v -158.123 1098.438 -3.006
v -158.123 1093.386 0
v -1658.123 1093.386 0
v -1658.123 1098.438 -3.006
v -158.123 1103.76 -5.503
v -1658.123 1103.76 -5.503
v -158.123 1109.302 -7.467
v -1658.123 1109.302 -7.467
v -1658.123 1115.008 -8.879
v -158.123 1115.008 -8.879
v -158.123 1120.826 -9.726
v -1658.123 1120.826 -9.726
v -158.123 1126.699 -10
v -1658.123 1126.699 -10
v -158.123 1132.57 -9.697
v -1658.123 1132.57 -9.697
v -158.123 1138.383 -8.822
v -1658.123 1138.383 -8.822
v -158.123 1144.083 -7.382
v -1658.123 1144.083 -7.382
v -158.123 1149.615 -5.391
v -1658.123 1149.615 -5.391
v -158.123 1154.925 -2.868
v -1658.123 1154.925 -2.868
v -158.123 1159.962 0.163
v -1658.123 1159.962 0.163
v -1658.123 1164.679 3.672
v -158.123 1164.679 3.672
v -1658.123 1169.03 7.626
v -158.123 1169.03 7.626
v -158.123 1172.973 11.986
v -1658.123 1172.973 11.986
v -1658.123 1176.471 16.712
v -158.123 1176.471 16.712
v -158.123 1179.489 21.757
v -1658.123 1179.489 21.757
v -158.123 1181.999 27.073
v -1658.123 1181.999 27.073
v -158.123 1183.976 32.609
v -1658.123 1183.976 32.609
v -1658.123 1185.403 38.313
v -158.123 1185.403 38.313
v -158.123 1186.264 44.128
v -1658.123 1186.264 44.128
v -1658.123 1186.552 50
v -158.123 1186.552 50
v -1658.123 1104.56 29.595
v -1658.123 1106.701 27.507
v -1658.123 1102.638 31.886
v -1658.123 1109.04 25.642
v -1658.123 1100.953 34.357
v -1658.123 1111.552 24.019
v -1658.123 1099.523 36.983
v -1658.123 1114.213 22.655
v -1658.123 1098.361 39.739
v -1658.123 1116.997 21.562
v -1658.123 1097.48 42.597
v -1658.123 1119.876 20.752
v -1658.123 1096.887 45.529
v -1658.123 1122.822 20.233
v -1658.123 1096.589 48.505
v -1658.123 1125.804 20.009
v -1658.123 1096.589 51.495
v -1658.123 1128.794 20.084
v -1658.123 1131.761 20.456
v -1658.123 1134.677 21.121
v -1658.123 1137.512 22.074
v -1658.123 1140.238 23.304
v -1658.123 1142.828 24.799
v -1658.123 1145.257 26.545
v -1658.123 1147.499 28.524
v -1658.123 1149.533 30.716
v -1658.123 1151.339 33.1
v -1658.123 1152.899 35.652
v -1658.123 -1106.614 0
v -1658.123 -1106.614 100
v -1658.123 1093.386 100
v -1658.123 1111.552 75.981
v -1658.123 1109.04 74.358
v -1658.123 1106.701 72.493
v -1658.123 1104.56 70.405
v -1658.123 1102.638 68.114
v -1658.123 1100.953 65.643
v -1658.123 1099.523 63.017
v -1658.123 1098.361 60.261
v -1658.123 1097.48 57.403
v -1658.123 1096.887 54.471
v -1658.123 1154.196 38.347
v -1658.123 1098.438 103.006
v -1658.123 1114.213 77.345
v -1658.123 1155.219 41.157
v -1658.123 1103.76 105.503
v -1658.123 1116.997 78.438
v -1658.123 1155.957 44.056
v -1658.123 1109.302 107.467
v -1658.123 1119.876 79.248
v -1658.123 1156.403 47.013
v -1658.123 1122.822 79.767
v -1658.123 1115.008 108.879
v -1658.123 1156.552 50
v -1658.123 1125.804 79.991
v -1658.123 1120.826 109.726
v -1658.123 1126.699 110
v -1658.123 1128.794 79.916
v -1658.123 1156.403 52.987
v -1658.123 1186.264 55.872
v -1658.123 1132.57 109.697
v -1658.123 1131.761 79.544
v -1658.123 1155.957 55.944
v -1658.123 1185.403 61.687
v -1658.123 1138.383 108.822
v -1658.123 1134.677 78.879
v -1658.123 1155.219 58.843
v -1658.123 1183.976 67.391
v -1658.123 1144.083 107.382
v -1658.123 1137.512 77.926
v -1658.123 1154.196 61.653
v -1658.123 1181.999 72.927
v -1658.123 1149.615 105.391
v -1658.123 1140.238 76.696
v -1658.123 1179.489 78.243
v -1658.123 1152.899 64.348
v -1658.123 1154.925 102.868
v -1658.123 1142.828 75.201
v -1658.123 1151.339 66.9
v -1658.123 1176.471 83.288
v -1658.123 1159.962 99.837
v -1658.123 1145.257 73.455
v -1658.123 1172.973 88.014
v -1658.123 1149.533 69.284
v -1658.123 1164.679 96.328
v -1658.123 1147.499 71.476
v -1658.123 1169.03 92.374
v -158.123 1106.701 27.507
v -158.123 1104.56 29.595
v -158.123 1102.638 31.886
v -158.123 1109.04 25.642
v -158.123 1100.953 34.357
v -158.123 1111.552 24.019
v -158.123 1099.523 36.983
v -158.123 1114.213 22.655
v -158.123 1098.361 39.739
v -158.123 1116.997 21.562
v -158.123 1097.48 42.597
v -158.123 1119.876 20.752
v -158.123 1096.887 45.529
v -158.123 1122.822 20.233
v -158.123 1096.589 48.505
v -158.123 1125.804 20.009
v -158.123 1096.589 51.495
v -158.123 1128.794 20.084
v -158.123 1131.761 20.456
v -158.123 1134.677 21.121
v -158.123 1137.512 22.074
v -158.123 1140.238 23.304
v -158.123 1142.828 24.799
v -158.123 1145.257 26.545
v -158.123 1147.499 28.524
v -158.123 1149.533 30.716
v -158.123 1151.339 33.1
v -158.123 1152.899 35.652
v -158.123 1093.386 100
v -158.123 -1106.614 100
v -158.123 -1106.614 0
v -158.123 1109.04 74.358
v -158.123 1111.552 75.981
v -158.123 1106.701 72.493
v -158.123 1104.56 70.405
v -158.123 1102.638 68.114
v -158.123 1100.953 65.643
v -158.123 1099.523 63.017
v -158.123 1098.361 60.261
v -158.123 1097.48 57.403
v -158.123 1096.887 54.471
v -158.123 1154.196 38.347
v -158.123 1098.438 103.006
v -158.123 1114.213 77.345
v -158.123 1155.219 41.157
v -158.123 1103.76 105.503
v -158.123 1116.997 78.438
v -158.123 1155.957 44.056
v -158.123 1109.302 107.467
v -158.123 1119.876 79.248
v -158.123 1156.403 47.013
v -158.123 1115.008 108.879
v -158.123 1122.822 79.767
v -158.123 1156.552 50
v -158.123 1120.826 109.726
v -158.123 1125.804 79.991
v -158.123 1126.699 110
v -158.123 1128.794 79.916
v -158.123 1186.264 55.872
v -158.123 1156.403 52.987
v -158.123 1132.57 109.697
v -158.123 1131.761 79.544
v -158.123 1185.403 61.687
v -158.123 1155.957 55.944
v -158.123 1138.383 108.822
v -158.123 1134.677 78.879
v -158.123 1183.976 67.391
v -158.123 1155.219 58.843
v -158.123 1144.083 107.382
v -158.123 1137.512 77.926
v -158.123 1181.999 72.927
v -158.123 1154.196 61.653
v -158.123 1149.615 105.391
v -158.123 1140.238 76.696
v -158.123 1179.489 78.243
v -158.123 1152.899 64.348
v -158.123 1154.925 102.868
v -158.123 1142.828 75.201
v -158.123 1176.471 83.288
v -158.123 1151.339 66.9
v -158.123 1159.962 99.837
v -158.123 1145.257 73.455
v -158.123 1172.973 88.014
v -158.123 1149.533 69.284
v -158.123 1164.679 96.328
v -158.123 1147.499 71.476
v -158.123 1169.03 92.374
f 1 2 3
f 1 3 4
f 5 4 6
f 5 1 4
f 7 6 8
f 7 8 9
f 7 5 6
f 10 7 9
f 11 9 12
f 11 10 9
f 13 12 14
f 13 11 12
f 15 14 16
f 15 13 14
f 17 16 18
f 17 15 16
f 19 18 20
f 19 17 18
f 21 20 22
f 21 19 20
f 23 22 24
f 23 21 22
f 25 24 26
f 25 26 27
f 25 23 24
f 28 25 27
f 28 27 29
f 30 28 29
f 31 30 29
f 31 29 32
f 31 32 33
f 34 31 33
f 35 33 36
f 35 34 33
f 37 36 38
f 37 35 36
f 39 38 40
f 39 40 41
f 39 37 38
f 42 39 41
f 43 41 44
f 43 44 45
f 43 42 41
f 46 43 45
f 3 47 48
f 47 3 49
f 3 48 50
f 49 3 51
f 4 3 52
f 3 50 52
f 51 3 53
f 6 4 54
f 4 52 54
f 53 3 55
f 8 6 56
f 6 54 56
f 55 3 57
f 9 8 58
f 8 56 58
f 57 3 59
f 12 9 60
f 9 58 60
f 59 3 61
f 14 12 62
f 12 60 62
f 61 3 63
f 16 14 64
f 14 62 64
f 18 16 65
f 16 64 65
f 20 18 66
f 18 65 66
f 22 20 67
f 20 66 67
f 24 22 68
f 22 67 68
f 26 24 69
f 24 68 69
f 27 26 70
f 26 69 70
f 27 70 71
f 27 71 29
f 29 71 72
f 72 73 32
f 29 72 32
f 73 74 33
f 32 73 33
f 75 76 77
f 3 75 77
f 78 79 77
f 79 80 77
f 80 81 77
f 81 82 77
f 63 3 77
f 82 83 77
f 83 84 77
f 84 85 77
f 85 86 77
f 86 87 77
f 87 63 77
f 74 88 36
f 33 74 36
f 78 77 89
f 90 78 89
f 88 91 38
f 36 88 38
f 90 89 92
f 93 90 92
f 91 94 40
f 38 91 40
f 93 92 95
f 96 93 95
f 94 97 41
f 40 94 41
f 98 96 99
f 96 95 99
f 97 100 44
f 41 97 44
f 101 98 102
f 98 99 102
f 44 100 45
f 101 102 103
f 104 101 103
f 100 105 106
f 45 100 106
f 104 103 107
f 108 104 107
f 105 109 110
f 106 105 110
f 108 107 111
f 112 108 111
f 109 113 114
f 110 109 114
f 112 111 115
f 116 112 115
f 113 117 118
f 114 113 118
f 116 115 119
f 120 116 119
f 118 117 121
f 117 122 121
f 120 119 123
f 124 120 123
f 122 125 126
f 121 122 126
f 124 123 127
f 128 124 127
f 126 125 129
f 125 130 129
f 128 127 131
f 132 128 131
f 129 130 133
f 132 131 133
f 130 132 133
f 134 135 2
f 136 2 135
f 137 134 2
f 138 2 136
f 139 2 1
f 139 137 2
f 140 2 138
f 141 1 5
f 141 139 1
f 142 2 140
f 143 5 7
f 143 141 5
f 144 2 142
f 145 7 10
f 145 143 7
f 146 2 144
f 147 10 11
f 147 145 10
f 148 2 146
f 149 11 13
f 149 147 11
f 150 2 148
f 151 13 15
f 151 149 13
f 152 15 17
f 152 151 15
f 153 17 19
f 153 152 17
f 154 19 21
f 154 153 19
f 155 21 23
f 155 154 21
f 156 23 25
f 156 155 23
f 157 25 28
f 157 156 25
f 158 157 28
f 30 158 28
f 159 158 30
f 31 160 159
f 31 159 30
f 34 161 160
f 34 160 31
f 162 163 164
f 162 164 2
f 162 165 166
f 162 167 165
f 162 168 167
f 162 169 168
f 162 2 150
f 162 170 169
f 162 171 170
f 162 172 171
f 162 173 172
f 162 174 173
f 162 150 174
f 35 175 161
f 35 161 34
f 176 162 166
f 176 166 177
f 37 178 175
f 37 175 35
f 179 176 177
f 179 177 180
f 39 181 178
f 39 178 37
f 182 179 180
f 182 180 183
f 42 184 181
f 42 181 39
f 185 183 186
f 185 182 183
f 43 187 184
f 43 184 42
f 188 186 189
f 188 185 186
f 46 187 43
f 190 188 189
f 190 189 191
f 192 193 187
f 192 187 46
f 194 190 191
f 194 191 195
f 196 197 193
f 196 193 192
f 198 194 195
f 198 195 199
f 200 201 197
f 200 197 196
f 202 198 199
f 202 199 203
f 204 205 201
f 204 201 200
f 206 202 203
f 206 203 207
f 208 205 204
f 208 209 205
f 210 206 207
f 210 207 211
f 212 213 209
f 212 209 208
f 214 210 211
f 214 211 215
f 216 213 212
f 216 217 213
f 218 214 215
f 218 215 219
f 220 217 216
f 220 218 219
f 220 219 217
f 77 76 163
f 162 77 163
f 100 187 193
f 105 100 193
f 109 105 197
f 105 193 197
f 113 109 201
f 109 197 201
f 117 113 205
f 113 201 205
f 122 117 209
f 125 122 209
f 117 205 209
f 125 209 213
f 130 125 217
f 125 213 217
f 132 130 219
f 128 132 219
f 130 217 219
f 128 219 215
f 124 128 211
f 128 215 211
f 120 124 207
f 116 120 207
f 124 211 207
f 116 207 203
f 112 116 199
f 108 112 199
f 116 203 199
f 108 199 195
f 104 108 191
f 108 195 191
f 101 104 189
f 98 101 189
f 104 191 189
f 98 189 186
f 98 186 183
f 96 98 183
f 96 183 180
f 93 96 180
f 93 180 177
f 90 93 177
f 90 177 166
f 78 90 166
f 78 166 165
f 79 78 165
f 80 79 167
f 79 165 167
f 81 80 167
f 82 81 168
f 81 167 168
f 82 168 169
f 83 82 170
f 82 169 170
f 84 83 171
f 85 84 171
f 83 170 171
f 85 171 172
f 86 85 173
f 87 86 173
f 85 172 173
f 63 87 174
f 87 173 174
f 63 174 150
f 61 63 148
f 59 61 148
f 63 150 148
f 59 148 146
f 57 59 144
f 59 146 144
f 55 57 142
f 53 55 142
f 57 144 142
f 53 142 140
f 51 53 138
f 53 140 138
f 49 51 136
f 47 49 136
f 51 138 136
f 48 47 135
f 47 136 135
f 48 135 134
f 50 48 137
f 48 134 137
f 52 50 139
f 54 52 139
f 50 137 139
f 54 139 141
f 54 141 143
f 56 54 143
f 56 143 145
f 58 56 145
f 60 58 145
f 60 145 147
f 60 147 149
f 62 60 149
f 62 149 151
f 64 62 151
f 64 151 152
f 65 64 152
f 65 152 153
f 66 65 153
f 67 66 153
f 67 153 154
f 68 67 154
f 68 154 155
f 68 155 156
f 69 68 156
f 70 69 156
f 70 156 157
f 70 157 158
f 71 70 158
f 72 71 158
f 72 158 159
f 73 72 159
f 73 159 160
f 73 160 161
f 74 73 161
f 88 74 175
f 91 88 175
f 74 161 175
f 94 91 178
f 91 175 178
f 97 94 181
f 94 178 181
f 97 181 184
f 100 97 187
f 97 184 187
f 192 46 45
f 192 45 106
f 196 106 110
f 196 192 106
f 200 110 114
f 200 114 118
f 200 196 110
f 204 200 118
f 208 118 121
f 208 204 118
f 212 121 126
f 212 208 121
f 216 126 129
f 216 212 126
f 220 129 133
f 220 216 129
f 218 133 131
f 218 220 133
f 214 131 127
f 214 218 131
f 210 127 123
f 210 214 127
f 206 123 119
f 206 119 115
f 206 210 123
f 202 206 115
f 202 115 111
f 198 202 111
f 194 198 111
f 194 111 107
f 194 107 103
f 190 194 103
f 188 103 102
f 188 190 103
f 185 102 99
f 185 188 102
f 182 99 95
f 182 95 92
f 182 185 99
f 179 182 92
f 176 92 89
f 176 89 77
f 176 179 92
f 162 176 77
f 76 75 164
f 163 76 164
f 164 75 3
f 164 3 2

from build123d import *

# Parameters (mm, degrees)
F0_W     = 1500
F0_H     = 2200
F1_DEPTH = 100
F2_R     = 30
F3_DEPTH = 1500


with BuildPart() as f1:
    # F0 (on Top) → F1 (new body)
    with BuildSketch(Plane.XY):
        with Locations((-908.122817, -6.614379)):
            Rectangle(F0_W, F0_H)
    extrude(amount=F1_DEPTH)

    # F2 (on face) → F3 (join, through all)
    with BuildSketch(Plane.YZ.offset(-158.122817)):
        with BuildLine():
            ThreePointArc((1093.385621, 0), (1154.924613, -2.867641), (1186.551869, 50))
            ThreePointArc((1186.551869, 50), (1154.924613, 102.867641), (1093.385621, 100))
            Line((1093.385621, 100), (1093.385621, 0))
        make_face()
        with Locations((1126.551869, 50)):
            Circle(F2_R, mode=Mode.SUBTRACT)
    extrude(amount=-F3_DEPTH)


solid = f1.part
